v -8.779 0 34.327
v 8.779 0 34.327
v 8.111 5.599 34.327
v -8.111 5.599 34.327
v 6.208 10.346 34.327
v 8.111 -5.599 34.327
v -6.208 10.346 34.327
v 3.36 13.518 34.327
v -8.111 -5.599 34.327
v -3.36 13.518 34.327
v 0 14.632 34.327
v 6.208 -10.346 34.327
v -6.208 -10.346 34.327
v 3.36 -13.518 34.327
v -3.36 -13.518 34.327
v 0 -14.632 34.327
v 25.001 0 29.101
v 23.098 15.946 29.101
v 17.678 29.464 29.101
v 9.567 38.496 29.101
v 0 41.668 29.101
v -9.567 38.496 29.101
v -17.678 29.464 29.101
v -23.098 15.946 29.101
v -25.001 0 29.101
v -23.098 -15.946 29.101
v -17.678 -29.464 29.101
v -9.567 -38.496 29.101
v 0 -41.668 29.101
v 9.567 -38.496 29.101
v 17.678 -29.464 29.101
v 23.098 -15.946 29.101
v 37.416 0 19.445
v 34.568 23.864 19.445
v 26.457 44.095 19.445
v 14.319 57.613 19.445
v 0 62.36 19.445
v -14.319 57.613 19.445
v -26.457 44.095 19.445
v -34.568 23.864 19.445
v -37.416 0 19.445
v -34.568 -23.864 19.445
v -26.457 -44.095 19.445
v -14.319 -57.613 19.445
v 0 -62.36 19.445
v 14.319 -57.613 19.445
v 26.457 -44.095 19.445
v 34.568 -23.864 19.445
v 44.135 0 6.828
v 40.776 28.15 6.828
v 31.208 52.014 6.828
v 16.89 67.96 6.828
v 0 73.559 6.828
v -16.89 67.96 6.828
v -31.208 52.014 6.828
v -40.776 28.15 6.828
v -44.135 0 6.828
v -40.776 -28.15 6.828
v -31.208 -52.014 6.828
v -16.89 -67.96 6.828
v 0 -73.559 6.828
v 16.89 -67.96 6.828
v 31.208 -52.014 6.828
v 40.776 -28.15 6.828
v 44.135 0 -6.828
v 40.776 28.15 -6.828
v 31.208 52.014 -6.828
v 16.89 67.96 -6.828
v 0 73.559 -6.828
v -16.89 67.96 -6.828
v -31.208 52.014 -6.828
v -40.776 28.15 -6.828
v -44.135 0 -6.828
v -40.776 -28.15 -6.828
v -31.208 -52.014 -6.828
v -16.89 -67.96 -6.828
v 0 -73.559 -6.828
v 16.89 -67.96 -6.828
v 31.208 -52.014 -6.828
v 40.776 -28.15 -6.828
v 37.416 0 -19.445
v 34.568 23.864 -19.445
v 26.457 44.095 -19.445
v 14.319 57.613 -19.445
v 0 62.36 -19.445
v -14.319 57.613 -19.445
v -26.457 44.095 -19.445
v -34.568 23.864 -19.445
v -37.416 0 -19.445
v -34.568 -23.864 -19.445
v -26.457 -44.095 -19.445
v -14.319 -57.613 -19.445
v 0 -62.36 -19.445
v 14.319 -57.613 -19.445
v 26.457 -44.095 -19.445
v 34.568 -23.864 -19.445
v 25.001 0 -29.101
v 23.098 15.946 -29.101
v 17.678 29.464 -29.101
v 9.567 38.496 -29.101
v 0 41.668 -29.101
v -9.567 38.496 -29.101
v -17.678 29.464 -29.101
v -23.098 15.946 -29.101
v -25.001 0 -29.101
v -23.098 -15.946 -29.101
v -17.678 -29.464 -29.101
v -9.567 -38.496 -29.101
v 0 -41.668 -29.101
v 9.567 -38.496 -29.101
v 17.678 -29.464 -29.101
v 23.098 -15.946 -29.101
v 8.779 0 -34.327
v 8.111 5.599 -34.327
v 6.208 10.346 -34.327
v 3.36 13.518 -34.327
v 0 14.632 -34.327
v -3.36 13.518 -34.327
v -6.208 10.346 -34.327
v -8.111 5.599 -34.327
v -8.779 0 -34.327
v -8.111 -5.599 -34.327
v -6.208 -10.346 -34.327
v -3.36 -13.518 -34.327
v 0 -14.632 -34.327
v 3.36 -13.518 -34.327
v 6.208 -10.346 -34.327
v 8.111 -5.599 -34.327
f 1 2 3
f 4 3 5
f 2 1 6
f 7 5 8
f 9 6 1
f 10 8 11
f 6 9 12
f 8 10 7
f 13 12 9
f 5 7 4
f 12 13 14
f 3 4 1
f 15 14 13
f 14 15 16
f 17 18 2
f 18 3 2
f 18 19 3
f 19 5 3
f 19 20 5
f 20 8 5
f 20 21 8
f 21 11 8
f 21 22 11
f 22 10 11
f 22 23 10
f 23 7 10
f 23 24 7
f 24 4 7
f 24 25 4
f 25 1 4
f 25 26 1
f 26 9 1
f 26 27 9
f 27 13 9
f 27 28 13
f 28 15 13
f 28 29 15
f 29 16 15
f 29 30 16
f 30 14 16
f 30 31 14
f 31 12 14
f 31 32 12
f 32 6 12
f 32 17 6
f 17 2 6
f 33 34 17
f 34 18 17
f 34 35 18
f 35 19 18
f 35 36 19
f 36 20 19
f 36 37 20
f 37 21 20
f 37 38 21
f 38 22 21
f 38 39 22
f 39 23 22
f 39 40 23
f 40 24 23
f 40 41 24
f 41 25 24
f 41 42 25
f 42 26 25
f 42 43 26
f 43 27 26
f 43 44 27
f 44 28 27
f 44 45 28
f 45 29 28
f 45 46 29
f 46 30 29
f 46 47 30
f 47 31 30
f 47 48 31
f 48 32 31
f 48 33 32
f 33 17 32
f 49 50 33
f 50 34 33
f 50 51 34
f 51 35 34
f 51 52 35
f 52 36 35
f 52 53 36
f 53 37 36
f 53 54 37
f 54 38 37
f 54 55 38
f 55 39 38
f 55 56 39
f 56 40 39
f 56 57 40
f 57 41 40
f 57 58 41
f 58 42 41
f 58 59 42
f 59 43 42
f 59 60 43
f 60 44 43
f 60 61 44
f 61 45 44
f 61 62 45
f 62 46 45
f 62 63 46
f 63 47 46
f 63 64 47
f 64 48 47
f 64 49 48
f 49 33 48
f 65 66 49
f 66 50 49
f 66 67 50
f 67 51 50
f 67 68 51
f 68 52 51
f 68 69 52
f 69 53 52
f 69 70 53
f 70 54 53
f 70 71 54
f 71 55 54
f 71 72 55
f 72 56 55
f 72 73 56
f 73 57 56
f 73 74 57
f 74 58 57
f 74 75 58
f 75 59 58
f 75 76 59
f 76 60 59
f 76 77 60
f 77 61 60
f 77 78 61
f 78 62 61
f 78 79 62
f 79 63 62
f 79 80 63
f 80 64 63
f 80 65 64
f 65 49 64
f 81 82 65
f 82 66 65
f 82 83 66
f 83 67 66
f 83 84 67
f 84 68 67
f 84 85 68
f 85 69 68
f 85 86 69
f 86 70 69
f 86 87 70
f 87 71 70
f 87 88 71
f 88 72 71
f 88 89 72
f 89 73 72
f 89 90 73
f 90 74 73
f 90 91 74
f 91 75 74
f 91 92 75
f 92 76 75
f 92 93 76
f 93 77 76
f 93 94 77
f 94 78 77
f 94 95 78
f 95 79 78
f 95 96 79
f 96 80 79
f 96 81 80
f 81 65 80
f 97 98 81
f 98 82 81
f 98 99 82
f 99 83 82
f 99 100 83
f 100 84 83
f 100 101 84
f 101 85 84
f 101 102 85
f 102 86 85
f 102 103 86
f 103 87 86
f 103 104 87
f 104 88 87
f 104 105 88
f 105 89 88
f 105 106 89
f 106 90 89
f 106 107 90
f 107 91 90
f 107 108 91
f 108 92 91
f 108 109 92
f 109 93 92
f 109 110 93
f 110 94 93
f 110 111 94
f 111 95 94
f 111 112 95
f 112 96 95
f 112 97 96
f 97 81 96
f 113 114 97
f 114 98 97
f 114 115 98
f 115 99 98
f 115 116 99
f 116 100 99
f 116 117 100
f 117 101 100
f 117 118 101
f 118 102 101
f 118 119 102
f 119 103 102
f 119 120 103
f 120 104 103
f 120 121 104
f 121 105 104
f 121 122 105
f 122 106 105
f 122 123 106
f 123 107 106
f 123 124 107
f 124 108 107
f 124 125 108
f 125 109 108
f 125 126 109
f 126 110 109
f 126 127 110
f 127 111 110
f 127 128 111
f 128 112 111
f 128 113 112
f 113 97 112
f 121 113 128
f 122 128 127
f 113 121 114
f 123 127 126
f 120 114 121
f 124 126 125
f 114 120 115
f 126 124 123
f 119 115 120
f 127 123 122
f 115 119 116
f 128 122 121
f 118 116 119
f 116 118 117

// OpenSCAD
// Generated by SolidPython 1.0.1 on 2020-07-29 00:46:49


scale(v = [9, 15, 7]) {
	sphere(r = 5);
}
/***********************************************
*********      SolidPython code:      **********
************************************************
 
# import packages: SolidPython
from solid import *
from solid.utils import *
from itertools import chain, combinations, permutations


class Resize:

    def __init__(self, scad_file):
        self.scad_file = scad_file
        #self.scad_file = import_scad(scad_file)
        # cone/cylinder param:
        self.r1 = 0
        self.r2 = 0
        self.h = 0
        # rectangular prism param:
        self.w = 0
        self.l = 0
        # ellipse param:
        self.r = 0

    # import OpenScad code (file name corresponds to shape)


    # classify shape + parameters
    def assign(self, param1, param2, param3):
        if self.scad_file == 'cone.scad':
            self.r1 = param1
            self.r2 = param2
            self.h = param3
        elif self.scad_file == 'cylinder.scad':
            self.r1 = param1
            self.r2 = param2
            self.h = param3
        elif self.scad_file == 'rectangularPrism.scad':
            self.h = param1
            self.l = param2
            self.w = param3
        else:
            self.r = param1
            self.h = param2

    # resize parameters
    def iterate(self):
        x = range(3, 20, 2)
        i = 1
        if self.scad_file == 'cone.scad':
            tempList = list(permutations(x, 2))
            for temp in tempList:
                param1 = temp[0]
                param2 = temp[1]
                filepath = 'produced_scad_files/' + 'cone' + str(param1) + '_' + str(param2) + '_' + '.scad'
                scad_render_to_file(cylinder(h=param1, r1=param2, r2=0), filepath)

        elif self.scad_file == 'cylinder.scad':
            tempList = list(permutations(x, 3))
            for temp in tempList:
                param1 = temp[0]
                param2 = temp[1]
                filepath = 'produced_scad_files/' + 'cylinder' + str(param1) + '_' + str(param2) + '_' + '.scad'
                scad_render_to_file(cylinder(h=param1, r1=param2, r2=param2), filepath)

        elif self.scad_file == 'rectangularPrism.scad':
            tempList = list(permutations(x, 3))
            for temp in tempList:
                param1 = temp[0]
                param2 = temp[1]
                param3 = temp[2]
                filepath = 'produced_scad_files/' + 'rectangularPrism' + str(param1) + '_' + str(param2) + '_' + str(
                    param3) + '.scad'
                scad_render_to_file(cube(size=(param1, param2, param3)), filepath)

        elif self.scad_file == 'ellipse.scad':
            tempList = list(permutations(x, 4))
            for temp in tempList:
                param1 = temp[0]
                param2 = temp[1]
                param3 = temp[2]
                param4 = temp[3]
                filepath = 'produced_scad_files/' + 'ellipse' + str(param1) + '_' + str(param2) + '_' + str(param3) + '_' + str(param4) + '.scad'
                scad_render_to_file(scale([param1, param2, param3])(sphere(r=param4)), filepath)

    def render_to_scadfile(self):
        scad_render_to_file(scad, 'example.scad') 
 
************************************************/
